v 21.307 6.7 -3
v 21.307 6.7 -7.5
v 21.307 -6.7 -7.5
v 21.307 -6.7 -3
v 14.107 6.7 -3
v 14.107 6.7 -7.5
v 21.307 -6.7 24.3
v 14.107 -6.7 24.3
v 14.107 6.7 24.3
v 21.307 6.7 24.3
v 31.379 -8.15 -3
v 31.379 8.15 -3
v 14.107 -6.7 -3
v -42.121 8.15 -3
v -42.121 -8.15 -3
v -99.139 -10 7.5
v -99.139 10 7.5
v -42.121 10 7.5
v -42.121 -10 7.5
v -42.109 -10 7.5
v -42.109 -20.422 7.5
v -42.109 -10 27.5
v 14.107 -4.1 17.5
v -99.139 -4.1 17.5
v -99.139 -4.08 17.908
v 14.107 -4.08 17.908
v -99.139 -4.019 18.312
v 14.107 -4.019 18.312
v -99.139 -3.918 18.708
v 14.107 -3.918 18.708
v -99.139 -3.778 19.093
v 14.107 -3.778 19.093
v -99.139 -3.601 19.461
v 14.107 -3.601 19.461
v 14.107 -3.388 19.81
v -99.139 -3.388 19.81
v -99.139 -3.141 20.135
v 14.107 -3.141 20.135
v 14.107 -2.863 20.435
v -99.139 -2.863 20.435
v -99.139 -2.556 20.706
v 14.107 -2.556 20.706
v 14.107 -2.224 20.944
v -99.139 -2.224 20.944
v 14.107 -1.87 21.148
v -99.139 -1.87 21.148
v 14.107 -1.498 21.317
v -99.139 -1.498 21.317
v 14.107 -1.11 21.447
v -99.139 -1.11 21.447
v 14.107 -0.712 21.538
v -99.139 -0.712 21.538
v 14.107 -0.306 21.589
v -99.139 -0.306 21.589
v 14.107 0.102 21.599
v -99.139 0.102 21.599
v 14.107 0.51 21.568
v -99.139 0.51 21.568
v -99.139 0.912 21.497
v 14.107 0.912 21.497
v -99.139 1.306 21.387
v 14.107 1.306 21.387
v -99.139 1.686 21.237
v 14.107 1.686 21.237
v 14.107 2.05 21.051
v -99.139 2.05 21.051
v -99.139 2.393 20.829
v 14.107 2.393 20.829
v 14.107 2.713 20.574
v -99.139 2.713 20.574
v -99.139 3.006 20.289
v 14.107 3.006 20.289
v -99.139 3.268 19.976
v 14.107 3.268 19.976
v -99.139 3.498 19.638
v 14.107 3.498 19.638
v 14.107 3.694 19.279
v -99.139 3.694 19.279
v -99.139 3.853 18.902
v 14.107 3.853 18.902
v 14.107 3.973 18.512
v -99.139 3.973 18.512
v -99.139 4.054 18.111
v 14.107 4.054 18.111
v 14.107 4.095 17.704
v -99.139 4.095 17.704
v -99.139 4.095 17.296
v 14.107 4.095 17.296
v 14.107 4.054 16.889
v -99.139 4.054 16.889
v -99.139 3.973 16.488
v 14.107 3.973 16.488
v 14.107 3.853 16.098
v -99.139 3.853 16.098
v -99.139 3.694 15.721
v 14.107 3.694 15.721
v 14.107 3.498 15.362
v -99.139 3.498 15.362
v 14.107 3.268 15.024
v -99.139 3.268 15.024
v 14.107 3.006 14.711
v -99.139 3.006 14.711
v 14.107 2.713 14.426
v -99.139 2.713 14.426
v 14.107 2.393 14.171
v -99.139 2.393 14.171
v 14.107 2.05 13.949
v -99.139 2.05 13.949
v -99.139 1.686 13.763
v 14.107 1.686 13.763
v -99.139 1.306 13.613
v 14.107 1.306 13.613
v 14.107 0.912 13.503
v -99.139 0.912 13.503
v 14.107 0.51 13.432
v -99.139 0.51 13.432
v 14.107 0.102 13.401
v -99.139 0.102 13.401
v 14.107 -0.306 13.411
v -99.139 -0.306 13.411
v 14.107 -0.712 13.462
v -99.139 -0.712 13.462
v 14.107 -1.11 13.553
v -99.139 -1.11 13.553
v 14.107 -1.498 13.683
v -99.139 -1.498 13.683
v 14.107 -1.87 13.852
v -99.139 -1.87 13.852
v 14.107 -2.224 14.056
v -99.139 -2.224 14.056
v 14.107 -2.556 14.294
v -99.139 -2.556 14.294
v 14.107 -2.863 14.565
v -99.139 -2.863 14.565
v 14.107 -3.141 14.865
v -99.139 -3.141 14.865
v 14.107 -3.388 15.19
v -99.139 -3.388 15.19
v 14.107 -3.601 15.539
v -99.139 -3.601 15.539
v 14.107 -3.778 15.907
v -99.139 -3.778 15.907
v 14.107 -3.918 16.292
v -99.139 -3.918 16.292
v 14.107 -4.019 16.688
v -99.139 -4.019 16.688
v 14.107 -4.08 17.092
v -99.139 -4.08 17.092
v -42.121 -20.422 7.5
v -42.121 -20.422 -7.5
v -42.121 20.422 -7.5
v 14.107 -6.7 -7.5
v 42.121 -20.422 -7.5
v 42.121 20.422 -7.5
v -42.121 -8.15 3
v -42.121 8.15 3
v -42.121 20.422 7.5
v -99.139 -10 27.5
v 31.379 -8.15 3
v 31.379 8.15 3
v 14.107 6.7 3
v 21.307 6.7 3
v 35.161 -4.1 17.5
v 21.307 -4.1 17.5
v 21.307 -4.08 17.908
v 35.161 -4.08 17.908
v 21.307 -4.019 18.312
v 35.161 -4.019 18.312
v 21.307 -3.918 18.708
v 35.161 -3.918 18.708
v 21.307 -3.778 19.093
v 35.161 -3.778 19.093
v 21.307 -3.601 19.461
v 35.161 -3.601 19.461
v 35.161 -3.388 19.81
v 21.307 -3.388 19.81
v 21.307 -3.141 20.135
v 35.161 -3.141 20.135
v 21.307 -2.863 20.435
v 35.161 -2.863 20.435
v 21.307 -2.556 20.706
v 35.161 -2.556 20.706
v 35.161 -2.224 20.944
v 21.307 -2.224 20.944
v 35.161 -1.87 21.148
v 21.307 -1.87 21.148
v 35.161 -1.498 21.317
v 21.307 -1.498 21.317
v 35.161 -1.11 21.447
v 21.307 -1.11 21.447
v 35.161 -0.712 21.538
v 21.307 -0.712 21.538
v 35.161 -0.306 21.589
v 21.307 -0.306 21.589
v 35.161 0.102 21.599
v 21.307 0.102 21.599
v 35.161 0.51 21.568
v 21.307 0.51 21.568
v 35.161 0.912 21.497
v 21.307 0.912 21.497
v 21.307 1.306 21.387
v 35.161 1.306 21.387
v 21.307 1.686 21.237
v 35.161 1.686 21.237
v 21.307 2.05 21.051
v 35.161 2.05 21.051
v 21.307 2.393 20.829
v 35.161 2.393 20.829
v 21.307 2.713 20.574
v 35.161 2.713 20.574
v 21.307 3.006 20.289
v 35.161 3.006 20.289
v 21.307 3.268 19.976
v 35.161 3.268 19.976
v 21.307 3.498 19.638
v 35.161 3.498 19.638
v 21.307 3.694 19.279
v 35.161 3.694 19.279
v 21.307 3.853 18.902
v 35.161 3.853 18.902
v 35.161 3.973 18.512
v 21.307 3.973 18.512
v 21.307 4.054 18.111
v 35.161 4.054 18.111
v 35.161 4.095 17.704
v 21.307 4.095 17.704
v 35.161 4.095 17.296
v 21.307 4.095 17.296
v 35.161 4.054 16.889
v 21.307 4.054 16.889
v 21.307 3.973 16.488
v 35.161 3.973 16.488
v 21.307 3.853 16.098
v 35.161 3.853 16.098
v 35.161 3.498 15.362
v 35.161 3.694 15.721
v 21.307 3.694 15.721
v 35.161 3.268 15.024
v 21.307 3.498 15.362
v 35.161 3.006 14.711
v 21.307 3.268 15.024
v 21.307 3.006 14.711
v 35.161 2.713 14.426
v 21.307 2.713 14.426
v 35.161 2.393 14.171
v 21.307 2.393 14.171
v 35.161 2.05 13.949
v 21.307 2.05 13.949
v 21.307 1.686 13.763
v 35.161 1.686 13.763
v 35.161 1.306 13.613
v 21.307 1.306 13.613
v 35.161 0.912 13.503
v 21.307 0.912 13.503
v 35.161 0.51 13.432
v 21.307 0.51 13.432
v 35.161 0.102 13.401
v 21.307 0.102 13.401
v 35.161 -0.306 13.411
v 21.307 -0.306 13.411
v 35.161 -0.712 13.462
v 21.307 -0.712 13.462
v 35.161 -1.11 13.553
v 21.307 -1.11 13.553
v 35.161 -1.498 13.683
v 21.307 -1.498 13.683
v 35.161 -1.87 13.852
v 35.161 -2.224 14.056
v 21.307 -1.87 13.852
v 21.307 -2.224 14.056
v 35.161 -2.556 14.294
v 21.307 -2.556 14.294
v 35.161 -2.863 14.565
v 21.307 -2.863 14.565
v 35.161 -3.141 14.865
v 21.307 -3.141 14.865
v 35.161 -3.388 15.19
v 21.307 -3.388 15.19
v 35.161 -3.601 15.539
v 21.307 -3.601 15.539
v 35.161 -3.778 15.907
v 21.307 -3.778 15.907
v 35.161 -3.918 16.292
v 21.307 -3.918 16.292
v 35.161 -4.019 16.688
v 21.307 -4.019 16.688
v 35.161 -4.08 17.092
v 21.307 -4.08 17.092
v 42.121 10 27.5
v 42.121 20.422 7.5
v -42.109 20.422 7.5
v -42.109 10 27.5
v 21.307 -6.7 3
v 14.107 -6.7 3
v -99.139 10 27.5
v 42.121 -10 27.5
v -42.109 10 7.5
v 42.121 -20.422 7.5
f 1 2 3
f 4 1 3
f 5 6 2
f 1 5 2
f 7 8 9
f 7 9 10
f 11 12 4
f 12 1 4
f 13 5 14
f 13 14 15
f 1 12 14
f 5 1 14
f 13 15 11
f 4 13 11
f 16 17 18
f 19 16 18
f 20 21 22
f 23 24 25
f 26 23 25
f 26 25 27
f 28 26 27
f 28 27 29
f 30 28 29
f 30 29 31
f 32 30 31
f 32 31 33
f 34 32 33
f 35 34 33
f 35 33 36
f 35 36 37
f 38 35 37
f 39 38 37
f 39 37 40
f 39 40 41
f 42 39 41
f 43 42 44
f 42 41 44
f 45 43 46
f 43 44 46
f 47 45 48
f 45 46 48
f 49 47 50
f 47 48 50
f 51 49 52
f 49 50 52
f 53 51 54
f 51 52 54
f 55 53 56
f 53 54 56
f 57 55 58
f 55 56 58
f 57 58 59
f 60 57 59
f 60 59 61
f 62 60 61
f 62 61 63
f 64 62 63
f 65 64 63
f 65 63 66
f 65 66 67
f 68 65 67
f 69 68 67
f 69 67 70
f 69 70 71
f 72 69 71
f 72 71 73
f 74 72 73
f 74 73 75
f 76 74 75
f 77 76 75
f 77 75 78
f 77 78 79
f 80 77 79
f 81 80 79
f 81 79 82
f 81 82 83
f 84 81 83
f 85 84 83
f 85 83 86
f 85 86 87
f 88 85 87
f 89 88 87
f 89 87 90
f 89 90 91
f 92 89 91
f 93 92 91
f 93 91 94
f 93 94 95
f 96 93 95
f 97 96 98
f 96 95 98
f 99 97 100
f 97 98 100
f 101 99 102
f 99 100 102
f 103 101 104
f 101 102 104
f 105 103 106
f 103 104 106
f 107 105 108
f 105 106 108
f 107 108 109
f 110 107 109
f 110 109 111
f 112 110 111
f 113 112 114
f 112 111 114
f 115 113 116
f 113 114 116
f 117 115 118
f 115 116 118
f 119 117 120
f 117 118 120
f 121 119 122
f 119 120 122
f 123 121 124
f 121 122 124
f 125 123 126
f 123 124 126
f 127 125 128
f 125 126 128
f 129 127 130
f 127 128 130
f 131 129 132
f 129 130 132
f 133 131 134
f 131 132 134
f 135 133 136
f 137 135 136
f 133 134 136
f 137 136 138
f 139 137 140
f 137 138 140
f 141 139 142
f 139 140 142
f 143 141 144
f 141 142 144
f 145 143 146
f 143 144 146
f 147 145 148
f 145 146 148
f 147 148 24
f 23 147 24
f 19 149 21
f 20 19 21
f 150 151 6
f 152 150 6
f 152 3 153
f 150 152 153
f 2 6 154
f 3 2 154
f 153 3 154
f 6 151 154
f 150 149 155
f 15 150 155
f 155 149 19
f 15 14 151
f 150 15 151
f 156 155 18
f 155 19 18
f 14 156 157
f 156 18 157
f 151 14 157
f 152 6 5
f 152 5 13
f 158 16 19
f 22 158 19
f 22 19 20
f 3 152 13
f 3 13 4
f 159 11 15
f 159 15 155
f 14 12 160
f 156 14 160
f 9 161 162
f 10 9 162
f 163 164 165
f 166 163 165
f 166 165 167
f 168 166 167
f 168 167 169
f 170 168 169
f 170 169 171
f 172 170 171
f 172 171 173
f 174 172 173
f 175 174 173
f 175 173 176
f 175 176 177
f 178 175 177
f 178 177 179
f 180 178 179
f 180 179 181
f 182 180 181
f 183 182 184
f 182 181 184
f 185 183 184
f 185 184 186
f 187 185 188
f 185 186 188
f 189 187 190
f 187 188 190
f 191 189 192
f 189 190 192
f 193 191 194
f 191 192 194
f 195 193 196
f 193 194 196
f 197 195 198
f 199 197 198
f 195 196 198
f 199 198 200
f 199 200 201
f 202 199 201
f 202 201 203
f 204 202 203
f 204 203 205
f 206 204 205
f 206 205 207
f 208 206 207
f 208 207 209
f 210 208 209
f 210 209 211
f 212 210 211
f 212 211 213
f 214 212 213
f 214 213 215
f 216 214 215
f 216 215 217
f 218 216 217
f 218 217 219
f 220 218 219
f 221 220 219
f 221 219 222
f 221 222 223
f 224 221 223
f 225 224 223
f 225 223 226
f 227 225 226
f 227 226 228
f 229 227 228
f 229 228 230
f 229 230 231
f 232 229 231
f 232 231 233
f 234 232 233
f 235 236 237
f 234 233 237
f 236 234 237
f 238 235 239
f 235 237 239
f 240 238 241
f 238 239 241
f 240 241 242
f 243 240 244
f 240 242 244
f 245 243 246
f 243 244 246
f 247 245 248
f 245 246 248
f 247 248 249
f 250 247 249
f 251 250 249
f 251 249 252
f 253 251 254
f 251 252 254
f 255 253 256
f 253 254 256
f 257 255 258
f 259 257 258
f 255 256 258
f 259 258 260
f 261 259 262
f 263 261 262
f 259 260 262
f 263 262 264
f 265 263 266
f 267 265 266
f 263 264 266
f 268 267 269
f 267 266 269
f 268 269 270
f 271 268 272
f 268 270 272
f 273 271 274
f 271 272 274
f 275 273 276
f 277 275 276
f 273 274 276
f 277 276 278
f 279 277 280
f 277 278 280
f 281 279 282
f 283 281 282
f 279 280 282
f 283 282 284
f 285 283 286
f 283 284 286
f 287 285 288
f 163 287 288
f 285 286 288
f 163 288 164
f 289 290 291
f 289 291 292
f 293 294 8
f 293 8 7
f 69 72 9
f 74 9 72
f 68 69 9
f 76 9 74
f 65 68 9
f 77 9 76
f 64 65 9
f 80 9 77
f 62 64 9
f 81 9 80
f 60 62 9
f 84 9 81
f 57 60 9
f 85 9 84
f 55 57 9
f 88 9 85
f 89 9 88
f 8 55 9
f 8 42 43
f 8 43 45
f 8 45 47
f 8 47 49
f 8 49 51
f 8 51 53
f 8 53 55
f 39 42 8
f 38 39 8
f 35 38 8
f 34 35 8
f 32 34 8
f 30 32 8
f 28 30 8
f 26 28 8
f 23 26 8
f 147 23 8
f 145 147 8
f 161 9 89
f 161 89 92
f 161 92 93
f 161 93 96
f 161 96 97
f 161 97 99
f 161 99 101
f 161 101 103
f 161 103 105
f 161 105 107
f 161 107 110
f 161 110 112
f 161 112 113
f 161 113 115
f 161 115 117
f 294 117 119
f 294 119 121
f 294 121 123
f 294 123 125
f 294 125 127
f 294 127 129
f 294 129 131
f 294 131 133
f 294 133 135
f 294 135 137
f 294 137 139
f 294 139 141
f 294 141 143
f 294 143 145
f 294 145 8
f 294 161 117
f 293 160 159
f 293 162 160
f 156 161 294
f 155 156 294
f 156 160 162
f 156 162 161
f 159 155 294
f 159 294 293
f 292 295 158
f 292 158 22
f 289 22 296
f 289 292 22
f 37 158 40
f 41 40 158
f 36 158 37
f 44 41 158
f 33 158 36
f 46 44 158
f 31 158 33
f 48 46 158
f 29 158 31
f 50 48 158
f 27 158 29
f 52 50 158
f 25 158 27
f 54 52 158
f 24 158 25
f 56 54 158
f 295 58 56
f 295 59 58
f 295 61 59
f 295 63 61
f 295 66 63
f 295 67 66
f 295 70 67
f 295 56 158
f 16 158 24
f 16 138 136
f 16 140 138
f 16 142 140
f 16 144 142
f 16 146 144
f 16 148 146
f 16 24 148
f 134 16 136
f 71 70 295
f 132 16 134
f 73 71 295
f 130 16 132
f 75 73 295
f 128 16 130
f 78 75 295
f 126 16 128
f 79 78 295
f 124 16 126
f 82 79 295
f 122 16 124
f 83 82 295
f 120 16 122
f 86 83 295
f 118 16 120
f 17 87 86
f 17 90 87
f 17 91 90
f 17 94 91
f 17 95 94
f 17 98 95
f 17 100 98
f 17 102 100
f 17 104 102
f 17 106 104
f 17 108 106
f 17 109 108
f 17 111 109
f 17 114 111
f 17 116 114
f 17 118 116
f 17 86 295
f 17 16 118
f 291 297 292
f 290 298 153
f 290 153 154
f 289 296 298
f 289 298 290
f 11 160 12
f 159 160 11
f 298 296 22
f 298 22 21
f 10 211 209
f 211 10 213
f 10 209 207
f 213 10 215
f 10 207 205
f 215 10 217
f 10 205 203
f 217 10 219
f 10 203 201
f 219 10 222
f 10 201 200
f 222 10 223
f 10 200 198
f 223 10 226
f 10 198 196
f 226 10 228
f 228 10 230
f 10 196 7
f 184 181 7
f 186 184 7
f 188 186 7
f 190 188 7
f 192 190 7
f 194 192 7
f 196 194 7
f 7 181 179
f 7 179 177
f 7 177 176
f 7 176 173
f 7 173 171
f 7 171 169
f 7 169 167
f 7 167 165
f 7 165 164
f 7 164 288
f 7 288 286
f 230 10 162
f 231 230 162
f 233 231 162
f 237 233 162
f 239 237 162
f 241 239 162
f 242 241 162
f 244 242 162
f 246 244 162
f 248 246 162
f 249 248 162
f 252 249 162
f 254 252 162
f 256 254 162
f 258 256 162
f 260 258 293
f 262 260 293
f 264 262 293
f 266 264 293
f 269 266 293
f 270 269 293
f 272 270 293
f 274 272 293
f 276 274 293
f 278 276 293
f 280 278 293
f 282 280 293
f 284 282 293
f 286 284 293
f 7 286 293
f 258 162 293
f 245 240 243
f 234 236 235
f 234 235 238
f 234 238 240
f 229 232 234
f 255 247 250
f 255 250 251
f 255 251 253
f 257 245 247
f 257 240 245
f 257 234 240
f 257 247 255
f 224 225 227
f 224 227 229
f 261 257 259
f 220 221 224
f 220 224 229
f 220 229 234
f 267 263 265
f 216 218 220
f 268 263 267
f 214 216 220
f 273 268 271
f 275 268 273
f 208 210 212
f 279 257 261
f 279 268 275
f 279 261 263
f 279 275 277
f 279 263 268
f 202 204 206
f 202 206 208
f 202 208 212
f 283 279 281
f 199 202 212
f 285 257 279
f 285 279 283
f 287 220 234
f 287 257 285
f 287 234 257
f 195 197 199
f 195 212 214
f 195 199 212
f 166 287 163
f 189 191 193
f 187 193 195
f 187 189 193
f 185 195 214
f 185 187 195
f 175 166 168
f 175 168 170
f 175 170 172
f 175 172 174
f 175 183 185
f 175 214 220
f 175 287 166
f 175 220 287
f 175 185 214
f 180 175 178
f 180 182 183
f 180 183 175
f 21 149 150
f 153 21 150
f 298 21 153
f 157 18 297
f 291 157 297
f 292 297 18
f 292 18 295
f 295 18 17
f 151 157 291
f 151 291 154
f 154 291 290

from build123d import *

# Parameters (mm, degrees)
F0_W      = 84.2419564724
F0_H      = 40.8445894718
F0_W_2    = 75
F0_H_2    = 16
F1_DEPTH  = 7.5
F2_W      = 16.3
F2_H      = 6
F3_DEPTH  = 73.5
F4_W      = 57.0175424218
F4_H      = 20
F4_W_2    = 84.2419564724
F5_DEPTH  = 20
F6_R      = 4.1
F7_DEPTH  = 134.3
F9_DEPTH  = 84.23
F10_W     = 7.2
F10_H     = 13.4
F11_DEPTH = 31.8


with BuildPart() as f1:
    # F0 (on Top) → F1 (new body, symmetric)
    with BuildSketch(Plane.XY):
        Rectangle(F0_W, F0_H)
        Rectangle(F0_W_2, F0_H_2, mode=Mode.SUBTRACT)
        Rectangle(F0_W_2, F0_H_2)
    extrude(amount=F1_DEPTH, both=True)

    # F2 (on face) → F3 (cut)
    with BuildSketch(Plane(origin=(-42.1209782362, 0, 0), x_dir=(0, -1, 0), z_dir=(-1, 0, 0))):
        Rectangle(F2_W, F2_H)
    extrude(amount=-F3_DEPTH, mode=Mode.SUBTRACT)

    # F4 (on face) → F5 (join)
    with BuildSketch(Plane.XY.offset(7.5)):
        with Locations((-70.6297494471, 0)):
            Rectangle(F4_W, F4_H)
        Rectangle(F4_W_2, F4_H)
    extrude(amount=F5_DEPTH)

    # F6 (on face) → F7 (cut)
    with BuildSketch(Plane(origin=(-99.138520658, 0, 0), x_dir=(0, -1, 0), z_dir=(-1, 0, 0))):
        with Locations((0, 17.5)):
            Circle(F6_R)
    extrude(amount=-F7_DEPTH, mode=Mode.SUBTRACT)

    # F8 (on face) → F9 (join)
    with BuildSketch(Plane.YZ.offset(42.1209782362)):
        Polygon((-10, 7.5), (-10, 27.5), (-20.4222947359, 7.5), align=None)
        Polygon((20.4222947359, 7.5), (10, 27.5), (10, 7.5), align=None)
    extrude(amount=-F9_DEPTH)

    # F10 (on face) → F11 (cut)
    with BuildSketch(Plane(origin=(0, 0, -7.5), x_dir=(1, 0, 0), z_dir=(0, 0, -1))):
        with Locations((17.7071348711, 0)):
            Rectangle(F10_W, F10_H)
    extrude(amount=-F11_DEPTH, mode=Mode.SUBTRACT)


solid = f1.part
